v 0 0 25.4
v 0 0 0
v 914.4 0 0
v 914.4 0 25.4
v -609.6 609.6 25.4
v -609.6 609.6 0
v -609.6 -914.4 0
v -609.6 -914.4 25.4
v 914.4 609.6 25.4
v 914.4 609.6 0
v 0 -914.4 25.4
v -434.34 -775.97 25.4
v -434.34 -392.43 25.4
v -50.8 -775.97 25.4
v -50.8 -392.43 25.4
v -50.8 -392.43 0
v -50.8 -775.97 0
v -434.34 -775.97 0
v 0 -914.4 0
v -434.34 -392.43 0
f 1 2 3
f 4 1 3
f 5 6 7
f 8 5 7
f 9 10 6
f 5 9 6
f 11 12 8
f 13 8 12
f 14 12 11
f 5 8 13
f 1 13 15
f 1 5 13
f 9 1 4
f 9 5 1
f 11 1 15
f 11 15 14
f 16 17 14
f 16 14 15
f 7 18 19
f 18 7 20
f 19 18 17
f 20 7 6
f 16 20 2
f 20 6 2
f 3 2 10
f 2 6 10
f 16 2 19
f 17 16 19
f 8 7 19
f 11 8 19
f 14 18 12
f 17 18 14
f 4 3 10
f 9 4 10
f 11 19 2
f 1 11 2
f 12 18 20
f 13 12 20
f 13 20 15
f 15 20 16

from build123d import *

# Parameters (mm, degrees)
F1_W     = 383.54
F1_H     = 383.54
F2_DEPTH = 25.4


with BuildPart() as f2:
    # F1 (on face) → F2 (new body)
    with BuildSketch(Plane.XY):
        Polygon((914.4, 609.6), (-609.6, 609.6), (-609.6, -914.4), (0, -914.4), (0, 0), (914.4, 0), align=None)
        with Locations((-242.57, -584.2)):
            Rectangle(F1_W, F1_H, mode=Mode.SUBTRACT)
    extrude(amount=F2_DEPTH)


solid = f2.part
